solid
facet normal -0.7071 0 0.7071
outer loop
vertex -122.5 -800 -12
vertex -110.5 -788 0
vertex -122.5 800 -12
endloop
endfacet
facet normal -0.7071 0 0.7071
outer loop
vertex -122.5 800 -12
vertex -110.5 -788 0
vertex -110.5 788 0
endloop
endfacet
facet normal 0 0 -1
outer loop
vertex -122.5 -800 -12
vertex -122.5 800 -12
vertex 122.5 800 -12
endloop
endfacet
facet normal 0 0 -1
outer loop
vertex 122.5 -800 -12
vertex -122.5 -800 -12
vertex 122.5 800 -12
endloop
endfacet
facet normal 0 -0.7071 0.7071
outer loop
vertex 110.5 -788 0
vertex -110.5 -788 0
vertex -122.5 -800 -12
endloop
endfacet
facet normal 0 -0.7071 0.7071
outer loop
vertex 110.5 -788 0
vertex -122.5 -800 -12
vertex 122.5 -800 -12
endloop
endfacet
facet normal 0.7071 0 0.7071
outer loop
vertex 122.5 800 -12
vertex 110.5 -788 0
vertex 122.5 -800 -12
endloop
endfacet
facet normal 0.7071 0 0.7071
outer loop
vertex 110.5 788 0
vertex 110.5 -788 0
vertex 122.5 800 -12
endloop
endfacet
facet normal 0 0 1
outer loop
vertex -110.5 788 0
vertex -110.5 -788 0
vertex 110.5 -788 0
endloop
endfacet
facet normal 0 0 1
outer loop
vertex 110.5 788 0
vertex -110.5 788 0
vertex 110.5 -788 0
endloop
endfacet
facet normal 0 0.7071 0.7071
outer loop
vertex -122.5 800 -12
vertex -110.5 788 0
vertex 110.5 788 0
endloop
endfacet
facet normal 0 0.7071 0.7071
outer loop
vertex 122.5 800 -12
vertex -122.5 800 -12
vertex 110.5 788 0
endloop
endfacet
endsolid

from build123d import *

# Parameters (mm, degrees)
F0_W     = 245
F0_H     = 1600
F1_DEPTH = 12
F2_SIZE  = 11.99999


# Not quite as in the source:
# - a fillet or chamfer is up to 0.001 mm smaller than in the source, because OpenCascade refuses the exact size


with BuildPart() as f1:
    # F0 (on Top) → F1 (new body)
    with BuildSketch(Plane.XY):
        Rectangle(F0_W, F0_H)
    extrude(amount=-F1_DEPTH)

    # F2 (size 12 in the source; OpenCascade refuses exactly that, so slightly less here)
    f2_edges = [f1.edges().sort_by_distance(p)[0] for p in [
        (0, -800, 0),
        (122.5, 0, 0),
        (-122.5, 0, 0),
        (0, 800, 0),
    ]]
    chamfer(f2_edges, length=F2_SIZE)


solid = f1.part
